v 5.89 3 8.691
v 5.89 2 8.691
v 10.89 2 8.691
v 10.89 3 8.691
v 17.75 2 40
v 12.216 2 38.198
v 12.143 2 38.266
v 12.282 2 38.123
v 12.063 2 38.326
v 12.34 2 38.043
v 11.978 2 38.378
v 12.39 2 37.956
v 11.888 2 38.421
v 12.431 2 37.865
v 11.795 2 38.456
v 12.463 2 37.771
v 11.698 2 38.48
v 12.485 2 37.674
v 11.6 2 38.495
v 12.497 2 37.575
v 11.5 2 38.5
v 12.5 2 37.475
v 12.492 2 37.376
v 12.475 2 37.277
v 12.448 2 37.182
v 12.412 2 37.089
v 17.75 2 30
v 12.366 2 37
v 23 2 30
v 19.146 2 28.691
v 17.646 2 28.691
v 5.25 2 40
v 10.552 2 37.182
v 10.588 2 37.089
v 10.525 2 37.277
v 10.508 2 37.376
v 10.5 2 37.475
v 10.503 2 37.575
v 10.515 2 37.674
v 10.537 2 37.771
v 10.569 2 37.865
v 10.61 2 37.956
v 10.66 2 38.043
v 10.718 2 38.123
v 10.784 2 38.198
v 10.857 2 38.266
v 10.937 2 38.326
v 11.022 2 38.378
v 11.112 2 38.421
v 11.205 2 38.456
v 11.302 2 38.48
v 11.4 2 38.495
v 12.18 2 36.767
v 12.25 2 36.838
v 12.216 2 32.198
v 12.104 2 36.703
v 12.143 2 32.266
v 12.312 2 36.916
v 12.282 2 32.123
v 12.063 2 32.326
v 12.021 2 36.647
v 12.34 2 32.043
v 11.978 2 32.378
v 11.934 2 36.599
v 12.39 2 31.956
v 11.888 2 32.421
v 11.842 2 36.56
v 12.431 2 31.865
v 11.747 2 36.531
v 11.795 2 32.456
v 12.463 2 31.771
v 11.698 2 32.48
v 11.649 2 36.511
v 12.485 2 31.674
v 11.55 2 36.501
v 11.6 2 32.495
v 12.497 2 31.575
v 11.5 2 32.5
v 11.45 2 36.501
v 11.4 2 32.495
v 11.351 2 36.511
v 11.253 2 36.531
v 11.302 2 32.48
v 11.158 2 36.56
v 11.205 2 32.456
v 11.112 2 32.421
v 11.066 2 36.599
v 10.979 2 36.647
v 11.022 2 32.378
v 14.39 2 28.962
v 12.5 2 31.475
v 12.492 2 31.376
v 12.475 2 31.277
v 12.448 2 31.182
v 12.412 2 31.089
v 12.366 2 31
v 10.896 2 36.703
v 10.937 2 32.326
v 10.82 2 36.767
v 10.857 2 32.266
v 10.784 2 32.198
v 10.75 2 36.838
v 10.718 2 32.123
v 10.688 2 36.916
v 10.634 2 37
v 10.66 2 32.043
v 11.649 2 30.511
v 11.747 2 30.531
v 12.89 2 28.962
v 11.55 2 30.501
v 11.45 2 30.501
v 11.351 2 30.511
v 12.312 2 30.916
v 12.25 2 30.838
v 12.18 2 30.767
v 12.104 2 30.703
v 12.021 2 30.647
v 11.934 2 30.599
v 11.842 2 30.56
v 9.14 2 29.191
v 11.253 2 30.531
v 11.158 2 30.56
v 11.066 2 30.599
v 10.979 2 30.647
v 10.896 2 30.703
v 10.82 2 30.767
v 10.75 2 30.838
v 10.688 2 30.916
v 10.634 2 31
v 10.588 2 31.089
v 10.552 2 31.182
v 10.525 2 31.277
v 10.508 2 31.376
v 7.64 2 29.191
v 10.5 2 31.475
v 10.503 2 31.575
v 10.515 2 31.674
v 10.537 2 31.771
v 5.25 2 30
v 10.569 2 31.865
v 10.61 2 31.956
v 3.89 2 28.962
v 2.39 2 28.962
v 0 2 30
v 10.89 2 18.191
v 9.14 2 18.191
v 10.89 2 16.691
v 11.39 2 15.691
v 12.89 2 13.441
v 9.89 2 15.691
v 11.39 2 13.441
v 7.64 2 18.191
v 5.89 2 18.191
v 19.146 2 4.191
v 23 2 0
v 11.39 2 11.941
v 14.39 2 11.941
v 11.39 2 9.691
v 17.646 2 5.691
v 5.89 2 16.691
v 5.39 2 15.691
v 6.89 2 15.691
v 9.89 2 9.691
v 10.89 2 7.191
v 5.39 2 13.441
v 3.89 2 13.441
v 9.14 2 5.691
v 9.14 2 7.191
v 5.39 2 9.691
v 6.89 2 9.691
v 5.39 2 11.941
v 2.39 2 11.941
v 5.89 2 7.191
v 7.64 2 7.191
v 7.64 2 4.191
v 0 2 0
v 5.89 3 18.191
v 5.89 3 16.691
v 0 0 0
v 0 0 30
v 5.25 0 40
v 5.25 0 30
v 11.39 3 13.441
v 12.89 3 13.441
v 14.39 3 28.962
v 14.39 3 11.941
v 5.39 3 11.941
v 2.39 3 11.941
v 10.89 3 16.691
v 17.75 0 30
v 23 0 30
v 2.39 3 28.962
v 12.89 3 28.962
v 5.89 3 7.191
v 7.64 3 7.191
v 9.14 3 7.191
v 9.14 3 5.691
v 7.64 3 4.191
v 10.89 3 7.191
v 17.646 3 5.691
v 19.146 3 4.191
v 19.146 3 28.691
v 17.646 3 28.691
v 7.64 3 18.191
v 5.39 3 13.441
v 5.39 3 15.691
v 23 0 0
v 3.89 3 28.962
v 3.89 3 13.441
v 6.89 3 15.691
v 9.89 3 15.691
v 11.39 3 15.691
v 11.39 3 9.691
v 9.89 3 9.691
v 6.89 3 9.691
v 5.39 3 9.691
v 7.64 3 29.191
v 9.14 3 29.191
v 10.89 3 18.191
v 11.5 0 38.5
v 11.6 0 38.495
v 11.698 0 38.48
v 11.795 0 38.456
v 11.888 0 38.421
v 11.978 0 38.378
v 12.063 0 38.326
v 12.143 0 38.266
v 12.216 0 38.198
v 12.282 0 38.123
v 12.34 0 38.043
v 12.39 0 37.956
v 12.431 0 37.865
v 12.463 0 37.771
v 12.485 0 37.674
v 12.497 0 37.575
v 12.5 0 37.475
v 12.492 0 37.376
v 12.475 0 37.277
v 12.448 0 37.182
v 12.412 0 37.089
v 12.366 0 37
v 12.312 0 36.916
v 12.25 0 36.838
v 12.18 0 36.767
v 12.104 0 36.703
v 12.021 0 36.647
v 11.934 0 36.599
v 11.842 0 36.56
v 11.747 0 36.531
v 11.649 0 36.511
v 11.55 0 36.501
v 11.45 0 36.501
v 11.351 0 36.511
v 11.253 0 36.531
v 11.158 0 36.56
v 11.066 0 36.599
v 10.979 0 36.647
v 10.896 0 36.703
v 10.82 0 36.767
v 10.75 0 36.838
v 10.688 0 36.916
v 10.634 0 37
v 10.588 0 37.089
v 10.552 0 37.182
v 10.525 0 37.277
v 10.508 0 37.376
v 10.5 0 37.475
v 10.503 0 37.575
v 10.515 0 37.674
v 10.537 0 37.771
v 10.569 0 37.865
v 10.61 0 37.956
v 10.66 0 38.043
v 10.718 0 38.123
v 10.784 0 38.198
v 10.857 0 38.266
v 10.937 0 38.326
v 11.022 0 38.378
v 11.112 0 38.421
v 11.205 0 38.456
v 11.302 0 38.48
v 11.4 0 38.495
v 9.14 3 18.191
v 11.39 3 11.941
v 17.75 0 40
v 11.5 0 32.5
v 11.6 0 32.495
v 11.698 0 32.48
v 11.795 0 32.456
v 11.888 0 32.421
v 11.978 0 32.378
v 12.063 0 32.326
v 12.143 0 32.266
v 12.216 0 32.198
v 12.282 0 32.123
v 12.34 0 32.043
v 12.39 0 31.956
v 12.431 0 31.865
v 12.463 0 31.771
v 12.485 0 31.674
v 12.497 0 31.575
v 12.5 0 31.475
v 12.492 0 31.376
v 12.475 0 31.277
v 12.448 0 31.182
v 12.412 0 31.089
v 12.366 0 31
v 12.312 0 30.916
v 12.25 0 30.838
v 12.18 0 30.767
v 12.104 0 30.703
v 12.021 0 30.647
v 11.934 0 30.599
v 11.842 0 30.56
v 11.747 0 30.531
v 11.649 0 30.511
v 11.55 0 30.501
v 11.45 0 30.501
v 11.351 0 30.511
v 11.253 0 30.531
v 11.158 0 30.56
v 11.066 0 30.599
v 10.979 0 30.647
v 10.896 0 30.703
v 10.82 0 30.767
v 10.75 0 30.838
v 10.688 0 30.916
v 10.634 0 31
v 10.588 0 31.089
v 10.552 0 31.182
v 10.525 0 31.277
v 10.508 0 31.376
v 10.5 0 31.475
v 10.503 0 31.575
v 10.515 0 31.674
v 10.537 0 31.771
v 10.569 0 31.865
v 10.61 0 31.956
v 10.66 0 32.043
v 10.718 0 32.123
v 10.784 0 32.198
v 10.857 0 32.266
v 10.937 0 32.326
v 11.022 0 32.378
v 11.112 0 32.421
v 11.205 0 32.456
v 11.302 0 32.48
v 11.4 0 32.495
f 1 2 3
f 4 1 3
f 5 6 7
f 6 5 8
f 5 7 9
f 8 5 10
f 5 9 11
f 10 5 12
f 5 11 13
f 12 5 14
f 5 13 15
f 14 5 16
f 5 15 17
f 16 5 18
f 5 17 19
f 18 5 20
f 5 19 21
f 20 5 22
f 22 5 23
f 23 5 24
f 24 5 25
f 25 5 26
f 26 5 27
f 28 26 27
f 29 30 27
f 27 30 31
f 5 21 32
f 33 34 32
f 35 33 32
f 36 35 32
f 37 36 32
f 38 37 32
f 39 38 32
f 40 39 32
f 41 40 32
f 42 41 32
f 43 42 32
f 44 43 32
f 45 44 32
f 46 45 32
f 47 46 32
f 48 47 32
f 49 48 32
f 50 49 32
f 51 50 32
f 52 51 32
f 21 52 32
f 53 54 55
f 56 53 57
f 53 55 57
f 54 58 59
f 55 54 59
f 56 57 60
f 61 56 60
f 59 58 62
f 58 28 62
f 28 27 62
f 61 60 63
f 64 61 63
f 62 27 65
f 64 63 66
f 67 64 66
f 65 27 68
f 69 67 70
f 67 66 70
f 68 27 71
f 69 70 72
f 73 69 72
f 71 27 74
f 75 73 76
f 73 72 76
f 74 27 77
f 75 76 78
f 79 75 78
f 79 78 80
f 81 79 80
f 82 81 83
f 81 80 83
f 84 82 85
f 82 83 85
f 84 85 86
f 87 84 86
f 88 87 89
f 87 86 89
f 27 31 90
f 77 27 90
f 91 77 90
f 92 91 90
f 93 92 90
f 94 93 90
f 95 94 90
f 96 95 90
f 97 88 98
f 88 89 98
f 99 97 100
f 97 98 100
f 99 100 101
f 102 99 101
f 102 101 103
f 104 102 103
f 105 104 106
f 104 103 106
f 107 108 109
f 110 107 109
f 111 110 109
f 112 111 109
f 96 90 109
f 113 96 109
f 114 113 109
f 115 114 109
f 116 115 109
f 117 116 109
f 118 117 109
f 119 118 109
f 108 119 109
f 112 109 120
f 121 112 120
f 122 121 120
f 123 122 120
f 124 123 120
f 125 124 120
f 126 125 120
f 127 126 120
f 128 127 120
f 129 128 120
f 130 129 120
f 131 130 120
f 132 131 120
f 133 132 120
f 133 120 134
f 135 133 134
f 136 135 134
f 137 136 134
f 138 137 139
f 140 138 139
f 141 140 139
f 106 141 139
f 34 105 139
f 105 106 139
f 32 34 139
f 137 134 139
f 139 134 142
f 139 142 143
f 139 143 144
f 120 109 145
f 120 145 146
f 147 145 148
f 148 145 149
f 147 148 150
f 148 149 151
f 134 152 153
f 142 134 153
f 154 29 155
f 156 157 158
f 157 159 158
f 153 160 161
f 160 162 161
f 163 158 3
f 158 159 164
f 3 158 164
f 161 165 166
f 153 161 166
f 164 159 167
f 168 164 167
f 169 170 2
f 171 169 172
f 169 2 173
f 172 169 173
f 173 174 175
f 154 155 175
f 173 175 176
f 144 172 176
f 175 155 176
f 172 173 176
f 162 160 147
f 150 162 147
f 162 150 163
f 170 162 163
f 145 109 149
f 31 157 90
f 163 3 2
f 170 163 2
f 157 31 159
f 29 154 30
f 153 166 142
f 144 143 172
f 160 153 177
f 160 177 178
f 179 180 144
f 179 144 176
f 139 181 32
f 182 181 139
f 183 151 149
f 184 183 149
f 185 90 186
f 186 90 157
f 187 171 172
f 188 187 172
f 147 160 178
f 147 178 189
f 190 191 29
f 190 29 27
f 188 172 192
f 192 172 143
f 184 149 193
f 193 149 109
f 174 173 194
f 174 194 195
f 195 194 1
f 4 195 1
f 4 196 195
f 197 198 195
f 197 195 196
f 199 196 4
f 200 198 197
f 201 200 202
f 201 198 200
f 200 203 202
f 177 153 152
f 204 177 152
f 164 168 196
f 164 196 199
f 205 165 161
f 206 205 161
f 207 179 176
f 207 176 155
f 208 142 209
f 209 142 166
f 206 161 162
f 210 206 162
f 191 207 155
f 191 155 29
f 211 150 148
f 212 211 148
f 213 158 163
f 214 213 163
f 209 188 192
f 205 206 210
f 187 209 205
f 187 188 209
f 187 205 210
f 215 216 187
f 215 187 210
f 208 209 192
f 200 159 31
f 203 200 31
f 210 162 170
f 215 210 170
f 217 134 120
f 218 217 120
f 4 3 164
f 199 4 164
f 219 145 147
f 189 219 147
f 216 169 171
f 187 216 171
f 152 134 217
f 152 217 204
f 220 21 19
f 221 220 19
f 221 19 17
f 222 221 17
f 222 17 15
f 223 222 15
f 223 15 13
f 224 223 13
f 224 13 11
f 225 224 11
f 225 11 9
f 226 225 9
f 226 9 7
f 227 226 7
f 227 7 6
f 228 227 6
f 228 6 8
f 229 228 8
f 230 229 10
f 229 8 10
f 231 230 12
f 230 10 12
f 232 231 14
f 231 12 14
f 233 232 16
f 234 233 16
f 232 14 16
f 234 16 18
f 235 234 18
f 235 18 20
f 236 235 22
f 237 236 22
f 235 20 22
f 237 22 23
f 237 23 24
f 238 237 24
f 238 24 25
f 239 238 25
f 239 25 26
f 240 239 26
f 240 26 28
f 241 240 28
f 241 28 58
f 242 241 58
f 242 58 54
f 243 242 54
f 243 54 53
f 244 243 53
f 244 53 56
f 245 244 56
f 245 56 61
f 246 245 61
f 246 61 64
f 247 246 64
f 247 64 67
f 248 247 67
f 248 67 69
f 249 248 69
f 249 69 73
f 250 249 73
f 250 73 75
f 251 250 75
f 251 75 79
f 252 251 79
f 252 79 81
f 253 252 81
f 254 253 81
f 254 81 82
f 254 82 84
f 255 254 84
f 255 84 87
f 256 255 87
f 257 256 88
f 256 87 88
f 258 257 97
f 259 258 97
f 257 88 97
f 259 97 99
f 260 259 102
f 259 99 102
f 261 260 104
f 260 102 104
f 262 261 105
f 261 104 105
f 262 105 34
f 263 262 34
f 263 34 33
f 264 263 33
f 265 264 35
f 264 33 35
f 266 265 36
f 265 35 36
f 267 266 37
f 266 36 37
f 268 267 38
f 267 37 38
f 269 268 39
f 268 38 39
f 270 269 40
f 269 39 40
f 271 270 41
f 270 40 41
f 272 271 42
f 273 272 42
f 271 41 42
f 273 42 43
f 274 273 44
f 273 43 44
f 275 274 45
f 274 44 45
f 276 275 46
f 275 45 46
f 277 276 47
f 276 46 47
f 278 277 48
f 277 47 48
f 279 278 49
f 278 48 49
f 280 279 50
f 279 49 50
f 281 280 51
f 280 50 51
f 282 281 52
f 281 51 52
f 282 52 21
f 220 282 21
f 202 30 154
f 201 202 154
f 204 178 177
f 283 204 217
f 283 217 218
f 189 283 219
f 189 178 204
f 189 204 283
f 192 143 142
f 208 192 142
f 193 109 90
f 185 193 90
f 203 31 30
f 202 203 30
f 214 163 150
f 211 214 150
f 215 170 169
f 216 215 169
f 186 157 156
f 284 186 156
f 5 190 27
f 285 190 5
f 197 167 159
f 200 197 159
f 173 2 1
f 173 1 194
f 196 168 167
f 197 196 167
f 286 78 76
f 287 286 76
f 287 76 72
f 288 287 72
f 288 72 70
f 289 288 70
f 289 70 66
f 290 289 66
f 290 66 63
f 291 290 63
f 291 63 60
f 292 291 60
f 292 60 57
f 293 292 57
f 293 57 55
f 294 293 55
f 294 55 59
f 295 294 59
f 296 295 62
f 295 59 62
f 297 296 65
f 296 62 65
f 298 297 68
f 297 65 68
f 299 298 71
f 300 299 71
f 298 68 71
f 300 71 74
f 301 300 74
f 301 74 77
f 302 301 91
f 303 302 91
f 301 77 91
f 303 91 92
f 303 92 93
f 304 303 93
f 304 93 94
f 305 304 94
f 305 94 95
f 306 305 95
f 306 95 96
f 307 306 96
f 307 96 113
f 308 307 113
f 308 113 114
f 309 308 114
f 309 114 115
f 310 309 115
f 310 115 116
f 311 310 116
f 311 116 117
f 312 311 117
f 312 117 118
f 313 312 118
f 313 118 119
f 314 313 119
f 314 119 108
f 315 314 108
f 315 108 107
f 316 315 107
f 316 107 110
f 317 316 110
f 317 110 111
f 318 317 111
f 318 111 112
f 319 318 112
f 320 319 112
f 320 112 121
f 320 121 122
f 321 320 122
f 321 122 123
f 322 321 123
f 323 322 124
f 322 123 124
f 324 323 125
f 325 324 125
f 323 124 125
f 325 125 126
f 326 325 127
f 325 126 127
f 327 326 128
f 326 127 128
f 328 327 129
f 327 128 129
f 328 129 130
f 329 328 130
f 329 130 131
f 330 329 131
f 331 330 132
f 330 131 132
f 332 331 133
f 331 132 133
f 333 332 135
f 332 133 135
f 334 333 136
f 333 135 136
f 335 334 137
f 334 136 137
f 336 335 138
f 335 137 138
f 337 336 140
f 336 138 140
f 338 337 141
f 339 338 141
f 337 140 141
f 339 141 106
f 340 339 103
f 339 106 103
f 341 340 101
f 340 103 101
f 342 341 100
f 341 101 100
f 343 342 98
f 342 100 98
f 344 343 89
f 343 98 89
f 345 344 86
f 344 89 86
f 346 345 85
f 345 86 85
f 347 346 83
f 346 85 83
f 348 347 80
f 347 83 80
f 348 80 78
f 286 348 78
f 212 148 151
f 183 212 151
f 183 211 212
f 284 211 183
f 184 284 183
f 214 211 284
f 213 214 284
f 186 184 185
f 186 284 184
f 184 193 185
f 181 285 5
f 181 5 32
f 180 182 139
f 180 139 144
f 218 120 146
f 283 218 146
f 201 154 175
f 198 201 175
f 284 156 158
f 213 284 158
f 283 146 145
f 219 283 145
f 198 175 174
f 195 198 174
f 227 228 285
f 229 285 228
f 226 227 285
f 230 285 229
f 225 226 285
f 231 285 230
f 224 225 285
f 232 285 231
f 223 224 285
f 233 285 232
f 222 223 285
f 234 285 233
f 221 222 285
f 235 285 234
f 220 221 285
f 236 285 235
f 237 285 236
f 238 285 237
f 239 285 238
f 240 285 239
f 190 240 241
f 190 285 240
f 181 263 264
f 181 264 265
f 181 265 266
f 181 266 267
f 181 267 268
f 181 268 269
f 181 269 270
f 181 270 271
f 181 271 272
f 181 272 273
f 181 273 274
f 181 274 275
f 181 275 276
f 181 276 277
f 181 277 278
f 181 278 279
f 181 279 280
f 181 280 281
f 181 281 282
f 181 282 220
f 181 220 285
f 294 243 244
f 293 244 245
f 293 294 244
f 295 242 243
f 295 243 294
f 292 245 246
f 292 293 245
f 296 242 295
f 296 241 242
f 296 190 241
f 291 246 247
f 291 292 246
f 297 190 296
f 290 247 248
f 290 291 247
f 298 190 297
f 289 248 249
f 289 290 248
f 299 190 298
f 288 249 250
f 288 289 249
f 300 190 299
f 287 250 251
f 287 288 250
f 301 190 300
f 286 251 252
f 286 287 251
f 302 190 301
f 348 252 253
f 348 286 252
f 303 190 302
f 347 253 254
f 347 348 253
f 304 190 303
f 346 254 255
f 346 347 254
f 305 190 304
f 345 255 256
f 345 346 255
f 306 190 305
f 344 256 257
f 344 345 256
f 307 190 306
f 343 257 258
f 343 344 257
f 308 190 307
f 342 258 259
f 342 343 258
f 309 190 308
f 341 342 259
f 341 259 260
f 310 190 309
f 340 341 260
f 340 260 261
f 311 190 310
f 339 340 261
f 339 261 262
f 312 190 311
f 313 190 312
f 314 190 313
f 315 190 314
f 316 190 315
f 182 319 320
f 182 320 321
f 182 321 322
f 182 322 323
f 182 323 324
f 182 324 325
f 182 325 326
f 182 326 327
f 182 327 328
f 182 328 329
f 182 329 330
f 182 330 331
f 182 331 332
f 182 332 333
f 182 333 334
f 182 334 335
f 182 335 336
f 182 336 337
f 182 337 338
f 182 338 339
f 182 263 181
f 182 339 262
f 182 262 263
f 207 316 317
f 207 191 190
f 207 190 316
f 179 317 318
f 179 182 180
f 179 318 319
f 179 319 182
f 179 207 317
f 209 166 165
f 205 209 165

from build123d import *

# Parameters (mm, degrees)
BOSS_EXTRUDE1_DEPTH = 2
SKETCH2_W           = 5
SKETCH2_H           = 1.5
BOSS_EXTRUDE2_DEPTH = 1
SKETCH3_W           = 1.5
SKETCH3_H           = 11
BOSS_EXTRUDE4_DEPTH = 1
SKETCH4_R           = 1
CUT_EXTRUDE1_DEPTH  = 47.184412955
LPATTERN1_COUNT     = 2
LPATTERN1_PITCH     = 6


with BuildPart() as part:
    # Sketch1 → Boss-Extrude1 (new body)
    with BuildSketch(Plane(origin=(0, 0, 0), x_dir=(1, 0, 0), z_dir=(0, 1, 0))):
        Polygon((5.25, -40), (5.25, -30), (0, -30), (0, 0), (23, 0), (23, -30), (17.75, -30), (17.75, -40), align=None)
    extrude(amount=BOSS_EXTRUDE1_DEPTH)

    # Sketch2 → Boss-Extrude2 (add)
    with BuildSketch(Plane(origin=(0, 2, 0), x_dir=(1, 0, 0), z_dir=(0, 1, 0))):
        Polygon((3.88999026, -13.440542412), (5.38999026, -13.440542412), (5.38999026, -15.690542412), (6.88999026, -15.690542412), (6.88999026, -9.690542412), (5.38999026, -9.690542412), (5.38999026, -11.940542412), (3.88999026, -11.940542412), (2.38999026, -11.940542412), (2.38999026, -13.440542412), (2.38999026, -28.962116838), (3.88999026, -28.962116838), align=None)
        with Locations((8.38999026, -7.940542412)):
            Rectangle(SKETCH2_W, SKETCH2_H)
        with Locations((8.38999026, -17.440542412)):
            Rectangle(SKETCH2_W, SKETCH2_H)
        Polygon((11.38999026, -9.690542412), (9.88999026, -9.690542412), (9.88999026, -15.690542412), (11.38999026, -15.690542412), (11.38999026, -13.440542412), (12.88999026, -13.440542412), (12.88999026, -28.962116838), (14.38999026, -28.962116838), (14.38999026, -13.440542412), (14.38999026, -11.940542412), (12.88999026, -11.940542412), (11.38999026, -11.940542412), align=None)
    extrude(amount=BOSS_EXTRUDE2_DEPTH)

    # Sketch3 → Boss-Extrude4 (add)
    with BuildSketch(Plane(origin=(0, 2, 0), x_dir=(1, 0, 0), z_dir=(0, 1, 0))):
        with Locations((8.38999026, -23.690542412)):
            Rectangle(SKETCH3_W, SKETCH3_H)
        Polygon((7.63999026, -4.190542412), (7.63999026, -7.190542412), (9.13999026, -7.190542412), (9.13999026, -5.690542412), (17.646471735, -5.690542412), (17.646471735, -28.690542412), (19.146471735, -28.690542412), (19.146471735, -4.190542412), align=None)
    extrude(amount=BOSS_EXTRUDE4_DEPTH)

    # Sketch4 → Cut-Extrude1 (cut, through all)
    with BuildSketch(Plane(origin=(0, 2, 0), x_dir=(1, 0, 0), z_dir=(0, 1, 0))):
        with Locations(Location((11.5, -37.5, 0), (0, 0, 270))):
            Circle(SKETCH4_R)
    cut_extrude1 = extrude(amount=-CUT_EXTRUDE1_DEPTH, mode=Mode.SUBTRACT)

    # LPattern1: Cut-Extrude1 ×2
    with Locations(*[(0, 0, -i * LPATTERN1_PITCH) for i in range(1, LPATTERN1_COUNT)]):
        add(cut_extrude1, mode=Mode.SUBTRACT)


solid = part.part
